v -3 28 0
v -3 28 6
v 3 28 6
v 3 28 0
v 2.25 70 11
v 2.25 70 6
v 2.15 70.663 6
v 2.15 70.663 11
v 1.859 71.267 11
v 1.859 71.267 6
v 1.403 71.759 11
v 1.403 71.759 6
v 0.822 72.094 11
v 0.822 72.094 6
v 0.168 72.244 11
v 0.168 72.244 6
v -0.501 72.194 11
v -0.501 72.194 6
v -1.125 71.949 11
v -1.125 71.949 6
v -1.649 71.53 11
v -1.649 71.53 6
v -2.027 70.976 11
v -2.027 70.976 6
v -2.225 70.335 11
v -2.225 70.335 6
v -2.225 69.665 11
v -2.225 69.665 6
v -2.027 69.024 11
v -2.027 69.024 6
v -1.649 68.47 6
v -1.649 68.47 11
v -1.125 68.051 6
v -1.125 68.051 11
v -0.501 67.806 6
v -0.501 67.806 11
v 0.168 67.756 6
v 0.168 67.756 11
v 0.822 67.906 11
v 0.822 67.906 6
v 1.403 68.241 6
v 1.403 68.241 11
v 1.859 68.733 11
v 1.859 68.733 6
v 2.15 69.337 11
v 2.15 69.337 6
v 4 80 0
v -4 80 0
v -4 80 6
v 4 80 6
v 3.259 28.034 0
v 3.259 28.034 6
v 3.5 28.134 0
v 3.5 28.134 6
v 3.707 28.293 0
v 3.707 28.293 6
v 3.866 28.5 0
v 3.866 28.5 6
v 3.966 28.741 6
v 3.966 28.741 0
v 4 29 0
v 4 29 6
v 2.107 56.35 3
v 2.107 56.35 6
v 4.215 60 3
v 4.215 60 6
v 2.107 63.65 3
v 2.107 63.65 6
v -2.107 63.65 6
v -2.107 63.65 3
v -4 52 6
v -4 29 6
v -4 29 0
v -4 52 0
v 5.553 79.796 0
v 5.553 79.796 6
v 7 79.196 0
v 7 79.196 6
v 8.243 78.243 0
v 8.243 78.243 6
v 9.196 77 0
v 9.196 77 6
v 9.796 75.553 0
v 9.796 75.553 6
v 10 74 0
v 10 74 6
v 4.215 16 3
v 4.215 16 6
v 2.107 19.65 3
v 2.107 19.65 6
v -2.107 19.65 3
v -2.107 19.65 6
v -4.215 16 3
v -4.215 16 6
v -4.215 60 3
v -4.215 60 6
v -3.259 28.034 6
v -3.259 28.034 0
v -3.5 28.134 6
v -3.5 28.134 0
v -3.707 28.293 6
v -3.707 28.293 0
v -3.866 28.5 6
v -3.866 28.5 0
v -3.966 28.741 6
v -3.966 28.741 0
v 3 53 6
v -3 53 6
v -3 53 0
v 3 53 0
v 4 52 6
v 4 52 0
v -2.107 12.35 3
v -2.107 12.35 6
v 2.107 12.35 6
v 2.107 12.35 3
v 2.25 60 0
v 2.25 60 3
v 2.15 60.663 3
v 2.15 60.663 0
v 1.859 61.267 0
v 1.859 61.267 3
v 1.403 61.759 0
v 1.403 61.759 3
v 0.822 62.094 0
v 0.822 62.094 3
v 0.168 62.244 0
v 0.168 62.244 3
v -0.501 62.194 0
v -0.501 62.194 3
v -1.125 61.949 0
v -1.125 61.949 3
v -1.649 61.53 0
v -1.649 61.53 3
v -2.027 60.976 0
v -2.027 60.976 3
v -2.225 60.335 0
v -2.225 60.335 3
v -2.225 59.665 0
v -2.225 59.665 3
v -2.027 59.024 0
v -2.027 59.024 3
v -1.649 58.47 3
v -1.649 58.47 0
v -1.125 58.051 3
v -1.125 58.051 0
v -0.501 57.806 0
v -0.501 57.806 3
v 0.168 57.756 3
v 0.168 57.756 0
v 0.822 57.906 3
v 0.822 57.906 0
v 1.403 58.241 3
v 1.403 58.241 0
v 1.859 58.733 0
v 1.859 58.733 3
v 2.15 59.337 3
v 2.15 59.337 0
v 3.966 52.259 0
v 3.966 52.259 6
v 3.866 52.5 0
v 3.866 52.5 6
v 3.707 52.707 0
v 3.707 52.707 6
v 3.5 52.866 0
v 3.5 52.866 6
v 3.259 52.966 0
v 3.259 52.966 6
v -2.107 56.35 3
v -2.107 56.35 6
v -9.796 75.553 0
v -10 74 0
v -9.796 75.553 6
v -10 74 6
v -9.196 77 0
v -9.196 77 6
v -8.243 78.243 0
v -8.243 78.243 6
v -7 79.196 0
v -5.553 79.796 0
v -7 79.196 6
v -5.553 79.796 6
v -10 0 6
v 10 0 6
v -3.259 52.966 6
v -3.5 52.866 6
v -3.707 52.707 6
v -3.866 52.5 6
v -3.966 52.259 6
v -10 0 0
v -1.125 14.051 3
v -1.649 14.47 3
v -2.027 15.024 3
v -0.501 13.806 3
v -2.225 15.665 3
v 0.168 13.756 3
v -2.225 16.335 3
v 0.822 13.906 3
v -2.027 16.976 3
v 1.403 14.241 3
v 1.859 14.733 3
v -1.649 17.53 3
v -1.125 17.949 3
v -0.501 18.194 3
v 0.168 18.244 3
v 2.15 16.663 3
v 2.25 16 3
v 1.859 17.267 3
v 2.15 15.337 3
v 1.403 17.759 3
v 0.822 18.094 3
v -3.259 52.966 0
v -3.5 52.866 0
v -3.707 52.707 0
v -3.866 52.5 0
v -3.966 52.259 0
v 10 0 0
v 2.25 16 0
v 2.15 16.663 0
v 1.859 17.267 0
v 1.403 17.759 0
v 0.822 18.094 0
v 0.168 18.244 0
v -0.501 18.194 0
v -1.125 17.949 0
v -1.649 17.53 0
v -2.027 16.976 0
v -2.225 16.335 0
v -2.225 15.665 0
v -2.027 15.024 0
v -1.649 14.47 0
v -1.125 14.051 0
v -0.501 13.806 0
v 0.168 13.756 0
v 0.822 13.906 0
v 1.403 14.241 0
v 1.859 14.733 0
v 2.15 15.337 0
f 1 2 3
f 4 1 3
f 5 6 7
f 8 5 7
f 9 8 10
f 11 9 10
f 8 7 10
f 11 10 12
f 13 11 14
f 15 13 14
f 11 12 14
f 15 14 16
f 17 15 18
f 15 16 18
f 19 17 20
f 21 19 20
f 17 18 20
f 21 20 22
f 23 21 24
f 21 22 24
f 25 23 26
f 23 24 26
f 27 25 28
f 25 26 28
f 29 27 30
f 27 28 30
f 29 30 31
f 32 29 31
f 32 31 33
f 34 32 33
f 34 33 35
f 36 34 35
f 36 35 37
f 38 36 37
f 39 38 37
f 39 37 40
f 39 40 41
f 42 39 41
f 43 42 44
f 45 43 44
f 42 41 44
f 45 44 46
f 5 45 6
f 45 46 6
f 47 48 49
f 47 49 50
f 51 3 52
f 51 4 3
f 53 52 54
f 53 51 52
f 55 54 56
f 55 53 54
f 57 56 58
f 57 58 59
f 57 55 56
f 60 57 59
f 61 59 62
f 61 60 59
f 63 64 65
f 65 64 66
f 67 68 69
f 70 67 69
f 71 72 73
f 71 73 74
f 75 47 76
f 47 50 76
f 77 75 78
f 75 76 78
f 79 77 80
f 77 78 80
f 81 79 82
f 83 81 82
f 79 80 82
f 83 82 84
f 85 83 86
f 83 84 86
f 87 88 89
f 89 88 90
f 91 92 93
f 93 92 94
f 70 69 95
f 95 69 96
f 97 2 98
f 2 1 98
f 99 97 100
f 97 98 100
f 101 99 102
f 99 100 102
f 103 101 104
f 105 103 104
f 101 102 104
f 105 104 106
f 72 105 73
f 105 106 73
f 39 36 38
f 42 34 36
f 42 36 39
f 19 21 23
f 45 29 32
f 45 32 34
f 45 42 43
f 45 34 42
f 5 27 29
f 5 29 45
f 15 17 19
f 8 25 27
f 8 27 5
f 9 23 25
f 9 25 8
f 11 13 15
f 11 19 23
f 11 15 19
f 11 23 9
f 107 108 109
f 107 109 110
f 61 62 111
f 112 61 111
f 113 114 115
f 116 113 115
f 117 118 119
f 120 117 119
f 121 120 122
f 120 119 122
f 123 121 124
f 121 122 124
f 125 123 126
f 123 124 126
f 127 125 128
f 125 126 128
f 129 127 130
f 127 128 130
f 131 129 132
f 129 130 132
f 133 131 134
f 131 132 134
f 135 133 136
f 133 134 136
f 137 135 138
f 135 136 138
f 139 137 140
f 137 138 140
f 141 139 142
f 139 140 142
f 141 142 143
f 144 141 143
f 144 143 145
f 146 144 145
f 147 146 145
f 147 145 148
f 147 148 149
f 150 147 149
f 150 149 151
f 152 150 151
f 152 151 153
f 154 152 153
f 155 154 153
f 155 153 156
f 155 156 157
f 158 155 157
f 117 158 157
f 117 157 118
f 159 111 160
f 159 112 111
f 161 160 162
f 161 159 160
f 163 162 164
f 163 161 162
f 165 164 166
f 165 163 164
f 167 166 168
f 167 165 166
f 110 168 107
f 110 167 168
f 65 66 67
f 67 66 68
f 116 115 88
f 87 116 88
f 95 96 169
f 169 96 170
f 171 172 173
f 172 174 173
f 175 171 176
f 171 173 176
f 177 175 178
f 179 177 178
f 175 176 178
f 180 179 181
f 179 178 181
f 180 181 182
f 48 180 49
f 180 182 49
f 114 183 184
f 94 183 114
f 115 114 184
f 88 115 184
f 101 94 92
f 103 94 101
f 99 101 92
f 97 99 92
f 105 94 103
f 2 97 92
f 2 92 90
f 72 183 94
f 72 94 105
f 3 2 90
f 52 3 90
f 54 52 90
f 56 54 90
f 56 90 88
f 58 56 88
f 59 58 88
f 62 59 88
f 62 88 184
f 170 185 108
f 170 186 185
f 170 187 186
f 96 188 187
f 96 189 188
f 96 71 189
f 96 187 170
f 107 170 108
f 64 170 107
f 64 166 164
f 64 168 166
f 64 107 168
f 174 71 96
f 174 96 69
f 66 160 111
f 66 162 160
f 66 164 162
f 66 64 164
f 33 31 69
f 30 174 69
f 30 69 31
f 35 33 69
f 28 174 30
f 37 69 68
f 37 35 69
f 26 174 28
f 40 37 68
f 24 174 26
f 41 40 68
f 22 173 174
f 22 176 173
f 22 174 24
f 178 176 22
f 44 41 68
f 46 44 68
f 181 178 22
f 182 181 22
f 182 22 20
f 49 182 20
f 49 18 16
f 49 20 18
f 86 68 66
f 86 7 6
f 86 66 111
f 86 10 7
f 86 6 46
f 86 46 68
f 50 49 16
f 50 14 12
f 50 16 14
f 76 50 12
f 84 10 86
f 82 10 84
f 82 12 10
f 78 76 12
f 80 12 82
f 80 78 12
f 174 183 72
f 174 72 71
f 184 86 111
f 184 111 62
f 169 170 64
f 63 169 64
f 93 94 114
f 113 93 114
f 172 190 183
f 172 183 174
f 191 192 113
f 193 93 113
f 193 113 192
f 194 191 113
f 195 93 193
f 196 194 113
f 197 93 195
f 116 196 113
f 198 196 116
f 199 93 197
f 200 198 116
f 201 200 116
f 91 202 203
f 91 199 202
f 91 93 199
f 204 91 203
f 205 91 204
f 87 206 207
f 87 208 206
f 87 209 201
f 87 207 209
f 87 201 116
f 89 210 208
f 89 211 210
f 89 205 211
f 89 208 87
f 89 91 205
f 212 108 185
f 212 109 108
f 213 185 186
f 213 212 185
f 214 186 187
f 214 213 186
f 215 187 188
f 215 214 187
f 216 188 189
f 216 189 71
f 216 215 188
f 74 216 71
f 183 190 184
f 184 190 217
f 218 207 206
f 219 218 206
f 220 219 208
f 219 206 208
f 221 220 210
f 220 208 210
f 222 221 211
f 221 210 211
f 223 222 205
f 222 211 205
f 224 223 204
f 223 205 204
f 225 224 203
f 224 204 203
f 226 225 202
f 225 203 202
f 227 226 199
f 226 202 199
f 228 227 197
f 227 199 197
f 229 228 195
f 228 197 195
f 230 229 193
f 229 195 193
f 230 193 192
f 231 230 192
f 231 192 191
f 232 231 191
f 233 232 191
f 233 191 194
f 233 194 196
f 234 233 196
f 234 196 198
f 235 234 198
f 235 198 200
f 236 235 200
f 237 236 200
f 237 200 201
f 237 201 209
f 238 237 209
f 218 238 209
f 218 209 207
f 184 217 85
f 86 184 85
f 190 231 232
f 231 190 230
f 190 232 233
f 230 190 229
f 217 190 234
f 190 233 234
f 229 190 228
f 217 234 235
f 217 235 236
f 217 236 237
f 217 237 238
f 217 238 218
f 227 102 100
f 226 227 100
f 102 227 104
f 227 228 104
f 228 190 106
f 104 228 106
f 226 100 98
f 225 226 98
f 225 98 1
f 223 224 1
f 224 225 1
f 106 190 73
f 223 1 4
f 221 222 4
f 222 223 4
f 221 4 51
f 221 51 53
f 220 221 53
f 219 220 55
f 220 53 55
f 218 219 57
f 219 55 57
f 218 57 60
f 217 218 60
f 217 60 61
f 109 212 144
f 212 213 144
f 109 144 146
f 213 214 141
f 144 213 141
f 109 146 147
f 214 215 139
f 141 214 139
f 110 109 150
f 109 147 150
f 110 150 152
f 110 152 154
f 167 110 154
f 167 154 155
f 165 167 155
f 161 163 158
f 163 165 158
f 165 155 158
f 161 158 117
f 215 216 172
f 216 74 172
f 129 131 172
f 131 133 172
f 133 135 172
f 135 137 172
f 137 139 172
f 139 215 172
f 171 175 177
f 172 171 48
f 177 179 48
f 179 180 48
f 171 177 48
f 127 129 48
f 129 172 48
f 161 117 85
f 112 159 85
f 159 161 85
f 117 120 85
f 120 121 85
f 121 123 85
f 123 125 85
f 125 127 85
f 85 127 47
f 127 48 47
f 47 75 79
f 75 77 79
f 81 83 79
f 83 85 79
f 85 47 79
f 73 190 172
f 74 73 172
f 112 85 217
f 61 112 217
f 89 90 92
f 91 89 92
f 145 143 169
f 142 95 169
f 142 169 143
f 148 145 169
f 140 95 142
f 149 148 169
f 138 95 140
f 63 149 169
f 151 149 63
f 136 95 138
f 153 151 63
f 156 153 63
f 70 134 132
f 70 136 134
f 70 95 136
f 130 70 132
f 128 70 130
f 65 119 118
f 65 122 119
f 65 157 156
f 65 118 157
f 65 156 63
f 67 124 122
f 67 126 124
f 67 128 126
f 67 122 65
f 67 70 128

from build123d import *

# Parameters (mm, degrees)
SKETCH_W        = 20
SKETCH_H        = 80
PAD_DEPTH       = 6
SKETCH001_R     = 2.25
PAD001_DEPTH    = 5
FILLET_R        = 6
SKETCH002_R     = 2.25
POCKET_DEPTH    = 8
POCKET001_DEPTH = 3
SKETCH004_W     = 8
SKETCH004_H     = 25
POCKET002_DEPTH = 7
FILLET001_R     = 1


with BuildPart() as part:
    # Sketch → Pad (new body)
    with BuildSketch(Plane.XY):
        with Locations((0, 40)):
            Rectangle(SKETCH_W, SKETCH_H)
    extrude(amount=PAD_DEPTH)

    # Sketch001 (on Face6 of Pad) → Pad001 (join)
    with BuildSketch(Plane.XY.offset(6)):
        with Locations((0, 70)):
            Circle(SKETCH001_R)
    extrude(amount=PAD001_DEPTH)

    # Fillet
    fillet_edges = [part.edges().sort_by_distance(p)[0] for p in [
        (-10, 80, 3),
        (10, 80, 3),
    ]]
    fillet(fillet_edges, radius=FILLET_R)

    # Sketch002 (on Face5 of Fillet) → Pocket (cut)
    with BuildSketch(Plane.XY.offset(6)):
        with Locations((0, 16)):
            Circle(SKETCH002_R)
        with Locations((0, 60)):
            Circle(SKETCH002_R)
    extrude(amount=-POCKET_DEPTH, mode=Mode.SUBTRACT)

    # Sketch003 (on Face5 of Pocket) → Pocket001 (cut)
    with BuildSketch(Plane.XY.offset(6)):
        Polygon((2.107328, 19.65), (-2.107328, 19.65), (-4.214657, 16), (-2.107328, 12.35), (2.107328, 12.35), (4.214657, 16), align=None)
        Polygon((2.107328, 56.35), (4.214657, 60), (2.107328, 63.65), (-2.107328, 63.65), (-4.214657, 60), (-2.107328, 56.35), align=None)
    extrude(amount=-POCKET001_DEPTH, mode=Mode.SUBTRACT)

    # Sketch004 (on Face5 of Pocket001) → Pocket002 (cut)
    with BuildSketch(Plane.XY.offset(6)):
        with Locations((0, 40.5)):
            Rectangle(SKETCH004_W, SKETCH004_H)
    extrude(amount=-POCKET002_DEPTH, mode=Mode.SUBTRACT)

    # Fillet001
    fillet001_edges = [part.edges().sort_by_distance(p)[0] for p in [
        (4, 53, 3),
        (-4, 53, 3),
        (-4, 28, 3),
        (4, 28, 3),
    ]]
    fillet(fillet001_edges, radius=FILLET001_R)


solid = part.part
